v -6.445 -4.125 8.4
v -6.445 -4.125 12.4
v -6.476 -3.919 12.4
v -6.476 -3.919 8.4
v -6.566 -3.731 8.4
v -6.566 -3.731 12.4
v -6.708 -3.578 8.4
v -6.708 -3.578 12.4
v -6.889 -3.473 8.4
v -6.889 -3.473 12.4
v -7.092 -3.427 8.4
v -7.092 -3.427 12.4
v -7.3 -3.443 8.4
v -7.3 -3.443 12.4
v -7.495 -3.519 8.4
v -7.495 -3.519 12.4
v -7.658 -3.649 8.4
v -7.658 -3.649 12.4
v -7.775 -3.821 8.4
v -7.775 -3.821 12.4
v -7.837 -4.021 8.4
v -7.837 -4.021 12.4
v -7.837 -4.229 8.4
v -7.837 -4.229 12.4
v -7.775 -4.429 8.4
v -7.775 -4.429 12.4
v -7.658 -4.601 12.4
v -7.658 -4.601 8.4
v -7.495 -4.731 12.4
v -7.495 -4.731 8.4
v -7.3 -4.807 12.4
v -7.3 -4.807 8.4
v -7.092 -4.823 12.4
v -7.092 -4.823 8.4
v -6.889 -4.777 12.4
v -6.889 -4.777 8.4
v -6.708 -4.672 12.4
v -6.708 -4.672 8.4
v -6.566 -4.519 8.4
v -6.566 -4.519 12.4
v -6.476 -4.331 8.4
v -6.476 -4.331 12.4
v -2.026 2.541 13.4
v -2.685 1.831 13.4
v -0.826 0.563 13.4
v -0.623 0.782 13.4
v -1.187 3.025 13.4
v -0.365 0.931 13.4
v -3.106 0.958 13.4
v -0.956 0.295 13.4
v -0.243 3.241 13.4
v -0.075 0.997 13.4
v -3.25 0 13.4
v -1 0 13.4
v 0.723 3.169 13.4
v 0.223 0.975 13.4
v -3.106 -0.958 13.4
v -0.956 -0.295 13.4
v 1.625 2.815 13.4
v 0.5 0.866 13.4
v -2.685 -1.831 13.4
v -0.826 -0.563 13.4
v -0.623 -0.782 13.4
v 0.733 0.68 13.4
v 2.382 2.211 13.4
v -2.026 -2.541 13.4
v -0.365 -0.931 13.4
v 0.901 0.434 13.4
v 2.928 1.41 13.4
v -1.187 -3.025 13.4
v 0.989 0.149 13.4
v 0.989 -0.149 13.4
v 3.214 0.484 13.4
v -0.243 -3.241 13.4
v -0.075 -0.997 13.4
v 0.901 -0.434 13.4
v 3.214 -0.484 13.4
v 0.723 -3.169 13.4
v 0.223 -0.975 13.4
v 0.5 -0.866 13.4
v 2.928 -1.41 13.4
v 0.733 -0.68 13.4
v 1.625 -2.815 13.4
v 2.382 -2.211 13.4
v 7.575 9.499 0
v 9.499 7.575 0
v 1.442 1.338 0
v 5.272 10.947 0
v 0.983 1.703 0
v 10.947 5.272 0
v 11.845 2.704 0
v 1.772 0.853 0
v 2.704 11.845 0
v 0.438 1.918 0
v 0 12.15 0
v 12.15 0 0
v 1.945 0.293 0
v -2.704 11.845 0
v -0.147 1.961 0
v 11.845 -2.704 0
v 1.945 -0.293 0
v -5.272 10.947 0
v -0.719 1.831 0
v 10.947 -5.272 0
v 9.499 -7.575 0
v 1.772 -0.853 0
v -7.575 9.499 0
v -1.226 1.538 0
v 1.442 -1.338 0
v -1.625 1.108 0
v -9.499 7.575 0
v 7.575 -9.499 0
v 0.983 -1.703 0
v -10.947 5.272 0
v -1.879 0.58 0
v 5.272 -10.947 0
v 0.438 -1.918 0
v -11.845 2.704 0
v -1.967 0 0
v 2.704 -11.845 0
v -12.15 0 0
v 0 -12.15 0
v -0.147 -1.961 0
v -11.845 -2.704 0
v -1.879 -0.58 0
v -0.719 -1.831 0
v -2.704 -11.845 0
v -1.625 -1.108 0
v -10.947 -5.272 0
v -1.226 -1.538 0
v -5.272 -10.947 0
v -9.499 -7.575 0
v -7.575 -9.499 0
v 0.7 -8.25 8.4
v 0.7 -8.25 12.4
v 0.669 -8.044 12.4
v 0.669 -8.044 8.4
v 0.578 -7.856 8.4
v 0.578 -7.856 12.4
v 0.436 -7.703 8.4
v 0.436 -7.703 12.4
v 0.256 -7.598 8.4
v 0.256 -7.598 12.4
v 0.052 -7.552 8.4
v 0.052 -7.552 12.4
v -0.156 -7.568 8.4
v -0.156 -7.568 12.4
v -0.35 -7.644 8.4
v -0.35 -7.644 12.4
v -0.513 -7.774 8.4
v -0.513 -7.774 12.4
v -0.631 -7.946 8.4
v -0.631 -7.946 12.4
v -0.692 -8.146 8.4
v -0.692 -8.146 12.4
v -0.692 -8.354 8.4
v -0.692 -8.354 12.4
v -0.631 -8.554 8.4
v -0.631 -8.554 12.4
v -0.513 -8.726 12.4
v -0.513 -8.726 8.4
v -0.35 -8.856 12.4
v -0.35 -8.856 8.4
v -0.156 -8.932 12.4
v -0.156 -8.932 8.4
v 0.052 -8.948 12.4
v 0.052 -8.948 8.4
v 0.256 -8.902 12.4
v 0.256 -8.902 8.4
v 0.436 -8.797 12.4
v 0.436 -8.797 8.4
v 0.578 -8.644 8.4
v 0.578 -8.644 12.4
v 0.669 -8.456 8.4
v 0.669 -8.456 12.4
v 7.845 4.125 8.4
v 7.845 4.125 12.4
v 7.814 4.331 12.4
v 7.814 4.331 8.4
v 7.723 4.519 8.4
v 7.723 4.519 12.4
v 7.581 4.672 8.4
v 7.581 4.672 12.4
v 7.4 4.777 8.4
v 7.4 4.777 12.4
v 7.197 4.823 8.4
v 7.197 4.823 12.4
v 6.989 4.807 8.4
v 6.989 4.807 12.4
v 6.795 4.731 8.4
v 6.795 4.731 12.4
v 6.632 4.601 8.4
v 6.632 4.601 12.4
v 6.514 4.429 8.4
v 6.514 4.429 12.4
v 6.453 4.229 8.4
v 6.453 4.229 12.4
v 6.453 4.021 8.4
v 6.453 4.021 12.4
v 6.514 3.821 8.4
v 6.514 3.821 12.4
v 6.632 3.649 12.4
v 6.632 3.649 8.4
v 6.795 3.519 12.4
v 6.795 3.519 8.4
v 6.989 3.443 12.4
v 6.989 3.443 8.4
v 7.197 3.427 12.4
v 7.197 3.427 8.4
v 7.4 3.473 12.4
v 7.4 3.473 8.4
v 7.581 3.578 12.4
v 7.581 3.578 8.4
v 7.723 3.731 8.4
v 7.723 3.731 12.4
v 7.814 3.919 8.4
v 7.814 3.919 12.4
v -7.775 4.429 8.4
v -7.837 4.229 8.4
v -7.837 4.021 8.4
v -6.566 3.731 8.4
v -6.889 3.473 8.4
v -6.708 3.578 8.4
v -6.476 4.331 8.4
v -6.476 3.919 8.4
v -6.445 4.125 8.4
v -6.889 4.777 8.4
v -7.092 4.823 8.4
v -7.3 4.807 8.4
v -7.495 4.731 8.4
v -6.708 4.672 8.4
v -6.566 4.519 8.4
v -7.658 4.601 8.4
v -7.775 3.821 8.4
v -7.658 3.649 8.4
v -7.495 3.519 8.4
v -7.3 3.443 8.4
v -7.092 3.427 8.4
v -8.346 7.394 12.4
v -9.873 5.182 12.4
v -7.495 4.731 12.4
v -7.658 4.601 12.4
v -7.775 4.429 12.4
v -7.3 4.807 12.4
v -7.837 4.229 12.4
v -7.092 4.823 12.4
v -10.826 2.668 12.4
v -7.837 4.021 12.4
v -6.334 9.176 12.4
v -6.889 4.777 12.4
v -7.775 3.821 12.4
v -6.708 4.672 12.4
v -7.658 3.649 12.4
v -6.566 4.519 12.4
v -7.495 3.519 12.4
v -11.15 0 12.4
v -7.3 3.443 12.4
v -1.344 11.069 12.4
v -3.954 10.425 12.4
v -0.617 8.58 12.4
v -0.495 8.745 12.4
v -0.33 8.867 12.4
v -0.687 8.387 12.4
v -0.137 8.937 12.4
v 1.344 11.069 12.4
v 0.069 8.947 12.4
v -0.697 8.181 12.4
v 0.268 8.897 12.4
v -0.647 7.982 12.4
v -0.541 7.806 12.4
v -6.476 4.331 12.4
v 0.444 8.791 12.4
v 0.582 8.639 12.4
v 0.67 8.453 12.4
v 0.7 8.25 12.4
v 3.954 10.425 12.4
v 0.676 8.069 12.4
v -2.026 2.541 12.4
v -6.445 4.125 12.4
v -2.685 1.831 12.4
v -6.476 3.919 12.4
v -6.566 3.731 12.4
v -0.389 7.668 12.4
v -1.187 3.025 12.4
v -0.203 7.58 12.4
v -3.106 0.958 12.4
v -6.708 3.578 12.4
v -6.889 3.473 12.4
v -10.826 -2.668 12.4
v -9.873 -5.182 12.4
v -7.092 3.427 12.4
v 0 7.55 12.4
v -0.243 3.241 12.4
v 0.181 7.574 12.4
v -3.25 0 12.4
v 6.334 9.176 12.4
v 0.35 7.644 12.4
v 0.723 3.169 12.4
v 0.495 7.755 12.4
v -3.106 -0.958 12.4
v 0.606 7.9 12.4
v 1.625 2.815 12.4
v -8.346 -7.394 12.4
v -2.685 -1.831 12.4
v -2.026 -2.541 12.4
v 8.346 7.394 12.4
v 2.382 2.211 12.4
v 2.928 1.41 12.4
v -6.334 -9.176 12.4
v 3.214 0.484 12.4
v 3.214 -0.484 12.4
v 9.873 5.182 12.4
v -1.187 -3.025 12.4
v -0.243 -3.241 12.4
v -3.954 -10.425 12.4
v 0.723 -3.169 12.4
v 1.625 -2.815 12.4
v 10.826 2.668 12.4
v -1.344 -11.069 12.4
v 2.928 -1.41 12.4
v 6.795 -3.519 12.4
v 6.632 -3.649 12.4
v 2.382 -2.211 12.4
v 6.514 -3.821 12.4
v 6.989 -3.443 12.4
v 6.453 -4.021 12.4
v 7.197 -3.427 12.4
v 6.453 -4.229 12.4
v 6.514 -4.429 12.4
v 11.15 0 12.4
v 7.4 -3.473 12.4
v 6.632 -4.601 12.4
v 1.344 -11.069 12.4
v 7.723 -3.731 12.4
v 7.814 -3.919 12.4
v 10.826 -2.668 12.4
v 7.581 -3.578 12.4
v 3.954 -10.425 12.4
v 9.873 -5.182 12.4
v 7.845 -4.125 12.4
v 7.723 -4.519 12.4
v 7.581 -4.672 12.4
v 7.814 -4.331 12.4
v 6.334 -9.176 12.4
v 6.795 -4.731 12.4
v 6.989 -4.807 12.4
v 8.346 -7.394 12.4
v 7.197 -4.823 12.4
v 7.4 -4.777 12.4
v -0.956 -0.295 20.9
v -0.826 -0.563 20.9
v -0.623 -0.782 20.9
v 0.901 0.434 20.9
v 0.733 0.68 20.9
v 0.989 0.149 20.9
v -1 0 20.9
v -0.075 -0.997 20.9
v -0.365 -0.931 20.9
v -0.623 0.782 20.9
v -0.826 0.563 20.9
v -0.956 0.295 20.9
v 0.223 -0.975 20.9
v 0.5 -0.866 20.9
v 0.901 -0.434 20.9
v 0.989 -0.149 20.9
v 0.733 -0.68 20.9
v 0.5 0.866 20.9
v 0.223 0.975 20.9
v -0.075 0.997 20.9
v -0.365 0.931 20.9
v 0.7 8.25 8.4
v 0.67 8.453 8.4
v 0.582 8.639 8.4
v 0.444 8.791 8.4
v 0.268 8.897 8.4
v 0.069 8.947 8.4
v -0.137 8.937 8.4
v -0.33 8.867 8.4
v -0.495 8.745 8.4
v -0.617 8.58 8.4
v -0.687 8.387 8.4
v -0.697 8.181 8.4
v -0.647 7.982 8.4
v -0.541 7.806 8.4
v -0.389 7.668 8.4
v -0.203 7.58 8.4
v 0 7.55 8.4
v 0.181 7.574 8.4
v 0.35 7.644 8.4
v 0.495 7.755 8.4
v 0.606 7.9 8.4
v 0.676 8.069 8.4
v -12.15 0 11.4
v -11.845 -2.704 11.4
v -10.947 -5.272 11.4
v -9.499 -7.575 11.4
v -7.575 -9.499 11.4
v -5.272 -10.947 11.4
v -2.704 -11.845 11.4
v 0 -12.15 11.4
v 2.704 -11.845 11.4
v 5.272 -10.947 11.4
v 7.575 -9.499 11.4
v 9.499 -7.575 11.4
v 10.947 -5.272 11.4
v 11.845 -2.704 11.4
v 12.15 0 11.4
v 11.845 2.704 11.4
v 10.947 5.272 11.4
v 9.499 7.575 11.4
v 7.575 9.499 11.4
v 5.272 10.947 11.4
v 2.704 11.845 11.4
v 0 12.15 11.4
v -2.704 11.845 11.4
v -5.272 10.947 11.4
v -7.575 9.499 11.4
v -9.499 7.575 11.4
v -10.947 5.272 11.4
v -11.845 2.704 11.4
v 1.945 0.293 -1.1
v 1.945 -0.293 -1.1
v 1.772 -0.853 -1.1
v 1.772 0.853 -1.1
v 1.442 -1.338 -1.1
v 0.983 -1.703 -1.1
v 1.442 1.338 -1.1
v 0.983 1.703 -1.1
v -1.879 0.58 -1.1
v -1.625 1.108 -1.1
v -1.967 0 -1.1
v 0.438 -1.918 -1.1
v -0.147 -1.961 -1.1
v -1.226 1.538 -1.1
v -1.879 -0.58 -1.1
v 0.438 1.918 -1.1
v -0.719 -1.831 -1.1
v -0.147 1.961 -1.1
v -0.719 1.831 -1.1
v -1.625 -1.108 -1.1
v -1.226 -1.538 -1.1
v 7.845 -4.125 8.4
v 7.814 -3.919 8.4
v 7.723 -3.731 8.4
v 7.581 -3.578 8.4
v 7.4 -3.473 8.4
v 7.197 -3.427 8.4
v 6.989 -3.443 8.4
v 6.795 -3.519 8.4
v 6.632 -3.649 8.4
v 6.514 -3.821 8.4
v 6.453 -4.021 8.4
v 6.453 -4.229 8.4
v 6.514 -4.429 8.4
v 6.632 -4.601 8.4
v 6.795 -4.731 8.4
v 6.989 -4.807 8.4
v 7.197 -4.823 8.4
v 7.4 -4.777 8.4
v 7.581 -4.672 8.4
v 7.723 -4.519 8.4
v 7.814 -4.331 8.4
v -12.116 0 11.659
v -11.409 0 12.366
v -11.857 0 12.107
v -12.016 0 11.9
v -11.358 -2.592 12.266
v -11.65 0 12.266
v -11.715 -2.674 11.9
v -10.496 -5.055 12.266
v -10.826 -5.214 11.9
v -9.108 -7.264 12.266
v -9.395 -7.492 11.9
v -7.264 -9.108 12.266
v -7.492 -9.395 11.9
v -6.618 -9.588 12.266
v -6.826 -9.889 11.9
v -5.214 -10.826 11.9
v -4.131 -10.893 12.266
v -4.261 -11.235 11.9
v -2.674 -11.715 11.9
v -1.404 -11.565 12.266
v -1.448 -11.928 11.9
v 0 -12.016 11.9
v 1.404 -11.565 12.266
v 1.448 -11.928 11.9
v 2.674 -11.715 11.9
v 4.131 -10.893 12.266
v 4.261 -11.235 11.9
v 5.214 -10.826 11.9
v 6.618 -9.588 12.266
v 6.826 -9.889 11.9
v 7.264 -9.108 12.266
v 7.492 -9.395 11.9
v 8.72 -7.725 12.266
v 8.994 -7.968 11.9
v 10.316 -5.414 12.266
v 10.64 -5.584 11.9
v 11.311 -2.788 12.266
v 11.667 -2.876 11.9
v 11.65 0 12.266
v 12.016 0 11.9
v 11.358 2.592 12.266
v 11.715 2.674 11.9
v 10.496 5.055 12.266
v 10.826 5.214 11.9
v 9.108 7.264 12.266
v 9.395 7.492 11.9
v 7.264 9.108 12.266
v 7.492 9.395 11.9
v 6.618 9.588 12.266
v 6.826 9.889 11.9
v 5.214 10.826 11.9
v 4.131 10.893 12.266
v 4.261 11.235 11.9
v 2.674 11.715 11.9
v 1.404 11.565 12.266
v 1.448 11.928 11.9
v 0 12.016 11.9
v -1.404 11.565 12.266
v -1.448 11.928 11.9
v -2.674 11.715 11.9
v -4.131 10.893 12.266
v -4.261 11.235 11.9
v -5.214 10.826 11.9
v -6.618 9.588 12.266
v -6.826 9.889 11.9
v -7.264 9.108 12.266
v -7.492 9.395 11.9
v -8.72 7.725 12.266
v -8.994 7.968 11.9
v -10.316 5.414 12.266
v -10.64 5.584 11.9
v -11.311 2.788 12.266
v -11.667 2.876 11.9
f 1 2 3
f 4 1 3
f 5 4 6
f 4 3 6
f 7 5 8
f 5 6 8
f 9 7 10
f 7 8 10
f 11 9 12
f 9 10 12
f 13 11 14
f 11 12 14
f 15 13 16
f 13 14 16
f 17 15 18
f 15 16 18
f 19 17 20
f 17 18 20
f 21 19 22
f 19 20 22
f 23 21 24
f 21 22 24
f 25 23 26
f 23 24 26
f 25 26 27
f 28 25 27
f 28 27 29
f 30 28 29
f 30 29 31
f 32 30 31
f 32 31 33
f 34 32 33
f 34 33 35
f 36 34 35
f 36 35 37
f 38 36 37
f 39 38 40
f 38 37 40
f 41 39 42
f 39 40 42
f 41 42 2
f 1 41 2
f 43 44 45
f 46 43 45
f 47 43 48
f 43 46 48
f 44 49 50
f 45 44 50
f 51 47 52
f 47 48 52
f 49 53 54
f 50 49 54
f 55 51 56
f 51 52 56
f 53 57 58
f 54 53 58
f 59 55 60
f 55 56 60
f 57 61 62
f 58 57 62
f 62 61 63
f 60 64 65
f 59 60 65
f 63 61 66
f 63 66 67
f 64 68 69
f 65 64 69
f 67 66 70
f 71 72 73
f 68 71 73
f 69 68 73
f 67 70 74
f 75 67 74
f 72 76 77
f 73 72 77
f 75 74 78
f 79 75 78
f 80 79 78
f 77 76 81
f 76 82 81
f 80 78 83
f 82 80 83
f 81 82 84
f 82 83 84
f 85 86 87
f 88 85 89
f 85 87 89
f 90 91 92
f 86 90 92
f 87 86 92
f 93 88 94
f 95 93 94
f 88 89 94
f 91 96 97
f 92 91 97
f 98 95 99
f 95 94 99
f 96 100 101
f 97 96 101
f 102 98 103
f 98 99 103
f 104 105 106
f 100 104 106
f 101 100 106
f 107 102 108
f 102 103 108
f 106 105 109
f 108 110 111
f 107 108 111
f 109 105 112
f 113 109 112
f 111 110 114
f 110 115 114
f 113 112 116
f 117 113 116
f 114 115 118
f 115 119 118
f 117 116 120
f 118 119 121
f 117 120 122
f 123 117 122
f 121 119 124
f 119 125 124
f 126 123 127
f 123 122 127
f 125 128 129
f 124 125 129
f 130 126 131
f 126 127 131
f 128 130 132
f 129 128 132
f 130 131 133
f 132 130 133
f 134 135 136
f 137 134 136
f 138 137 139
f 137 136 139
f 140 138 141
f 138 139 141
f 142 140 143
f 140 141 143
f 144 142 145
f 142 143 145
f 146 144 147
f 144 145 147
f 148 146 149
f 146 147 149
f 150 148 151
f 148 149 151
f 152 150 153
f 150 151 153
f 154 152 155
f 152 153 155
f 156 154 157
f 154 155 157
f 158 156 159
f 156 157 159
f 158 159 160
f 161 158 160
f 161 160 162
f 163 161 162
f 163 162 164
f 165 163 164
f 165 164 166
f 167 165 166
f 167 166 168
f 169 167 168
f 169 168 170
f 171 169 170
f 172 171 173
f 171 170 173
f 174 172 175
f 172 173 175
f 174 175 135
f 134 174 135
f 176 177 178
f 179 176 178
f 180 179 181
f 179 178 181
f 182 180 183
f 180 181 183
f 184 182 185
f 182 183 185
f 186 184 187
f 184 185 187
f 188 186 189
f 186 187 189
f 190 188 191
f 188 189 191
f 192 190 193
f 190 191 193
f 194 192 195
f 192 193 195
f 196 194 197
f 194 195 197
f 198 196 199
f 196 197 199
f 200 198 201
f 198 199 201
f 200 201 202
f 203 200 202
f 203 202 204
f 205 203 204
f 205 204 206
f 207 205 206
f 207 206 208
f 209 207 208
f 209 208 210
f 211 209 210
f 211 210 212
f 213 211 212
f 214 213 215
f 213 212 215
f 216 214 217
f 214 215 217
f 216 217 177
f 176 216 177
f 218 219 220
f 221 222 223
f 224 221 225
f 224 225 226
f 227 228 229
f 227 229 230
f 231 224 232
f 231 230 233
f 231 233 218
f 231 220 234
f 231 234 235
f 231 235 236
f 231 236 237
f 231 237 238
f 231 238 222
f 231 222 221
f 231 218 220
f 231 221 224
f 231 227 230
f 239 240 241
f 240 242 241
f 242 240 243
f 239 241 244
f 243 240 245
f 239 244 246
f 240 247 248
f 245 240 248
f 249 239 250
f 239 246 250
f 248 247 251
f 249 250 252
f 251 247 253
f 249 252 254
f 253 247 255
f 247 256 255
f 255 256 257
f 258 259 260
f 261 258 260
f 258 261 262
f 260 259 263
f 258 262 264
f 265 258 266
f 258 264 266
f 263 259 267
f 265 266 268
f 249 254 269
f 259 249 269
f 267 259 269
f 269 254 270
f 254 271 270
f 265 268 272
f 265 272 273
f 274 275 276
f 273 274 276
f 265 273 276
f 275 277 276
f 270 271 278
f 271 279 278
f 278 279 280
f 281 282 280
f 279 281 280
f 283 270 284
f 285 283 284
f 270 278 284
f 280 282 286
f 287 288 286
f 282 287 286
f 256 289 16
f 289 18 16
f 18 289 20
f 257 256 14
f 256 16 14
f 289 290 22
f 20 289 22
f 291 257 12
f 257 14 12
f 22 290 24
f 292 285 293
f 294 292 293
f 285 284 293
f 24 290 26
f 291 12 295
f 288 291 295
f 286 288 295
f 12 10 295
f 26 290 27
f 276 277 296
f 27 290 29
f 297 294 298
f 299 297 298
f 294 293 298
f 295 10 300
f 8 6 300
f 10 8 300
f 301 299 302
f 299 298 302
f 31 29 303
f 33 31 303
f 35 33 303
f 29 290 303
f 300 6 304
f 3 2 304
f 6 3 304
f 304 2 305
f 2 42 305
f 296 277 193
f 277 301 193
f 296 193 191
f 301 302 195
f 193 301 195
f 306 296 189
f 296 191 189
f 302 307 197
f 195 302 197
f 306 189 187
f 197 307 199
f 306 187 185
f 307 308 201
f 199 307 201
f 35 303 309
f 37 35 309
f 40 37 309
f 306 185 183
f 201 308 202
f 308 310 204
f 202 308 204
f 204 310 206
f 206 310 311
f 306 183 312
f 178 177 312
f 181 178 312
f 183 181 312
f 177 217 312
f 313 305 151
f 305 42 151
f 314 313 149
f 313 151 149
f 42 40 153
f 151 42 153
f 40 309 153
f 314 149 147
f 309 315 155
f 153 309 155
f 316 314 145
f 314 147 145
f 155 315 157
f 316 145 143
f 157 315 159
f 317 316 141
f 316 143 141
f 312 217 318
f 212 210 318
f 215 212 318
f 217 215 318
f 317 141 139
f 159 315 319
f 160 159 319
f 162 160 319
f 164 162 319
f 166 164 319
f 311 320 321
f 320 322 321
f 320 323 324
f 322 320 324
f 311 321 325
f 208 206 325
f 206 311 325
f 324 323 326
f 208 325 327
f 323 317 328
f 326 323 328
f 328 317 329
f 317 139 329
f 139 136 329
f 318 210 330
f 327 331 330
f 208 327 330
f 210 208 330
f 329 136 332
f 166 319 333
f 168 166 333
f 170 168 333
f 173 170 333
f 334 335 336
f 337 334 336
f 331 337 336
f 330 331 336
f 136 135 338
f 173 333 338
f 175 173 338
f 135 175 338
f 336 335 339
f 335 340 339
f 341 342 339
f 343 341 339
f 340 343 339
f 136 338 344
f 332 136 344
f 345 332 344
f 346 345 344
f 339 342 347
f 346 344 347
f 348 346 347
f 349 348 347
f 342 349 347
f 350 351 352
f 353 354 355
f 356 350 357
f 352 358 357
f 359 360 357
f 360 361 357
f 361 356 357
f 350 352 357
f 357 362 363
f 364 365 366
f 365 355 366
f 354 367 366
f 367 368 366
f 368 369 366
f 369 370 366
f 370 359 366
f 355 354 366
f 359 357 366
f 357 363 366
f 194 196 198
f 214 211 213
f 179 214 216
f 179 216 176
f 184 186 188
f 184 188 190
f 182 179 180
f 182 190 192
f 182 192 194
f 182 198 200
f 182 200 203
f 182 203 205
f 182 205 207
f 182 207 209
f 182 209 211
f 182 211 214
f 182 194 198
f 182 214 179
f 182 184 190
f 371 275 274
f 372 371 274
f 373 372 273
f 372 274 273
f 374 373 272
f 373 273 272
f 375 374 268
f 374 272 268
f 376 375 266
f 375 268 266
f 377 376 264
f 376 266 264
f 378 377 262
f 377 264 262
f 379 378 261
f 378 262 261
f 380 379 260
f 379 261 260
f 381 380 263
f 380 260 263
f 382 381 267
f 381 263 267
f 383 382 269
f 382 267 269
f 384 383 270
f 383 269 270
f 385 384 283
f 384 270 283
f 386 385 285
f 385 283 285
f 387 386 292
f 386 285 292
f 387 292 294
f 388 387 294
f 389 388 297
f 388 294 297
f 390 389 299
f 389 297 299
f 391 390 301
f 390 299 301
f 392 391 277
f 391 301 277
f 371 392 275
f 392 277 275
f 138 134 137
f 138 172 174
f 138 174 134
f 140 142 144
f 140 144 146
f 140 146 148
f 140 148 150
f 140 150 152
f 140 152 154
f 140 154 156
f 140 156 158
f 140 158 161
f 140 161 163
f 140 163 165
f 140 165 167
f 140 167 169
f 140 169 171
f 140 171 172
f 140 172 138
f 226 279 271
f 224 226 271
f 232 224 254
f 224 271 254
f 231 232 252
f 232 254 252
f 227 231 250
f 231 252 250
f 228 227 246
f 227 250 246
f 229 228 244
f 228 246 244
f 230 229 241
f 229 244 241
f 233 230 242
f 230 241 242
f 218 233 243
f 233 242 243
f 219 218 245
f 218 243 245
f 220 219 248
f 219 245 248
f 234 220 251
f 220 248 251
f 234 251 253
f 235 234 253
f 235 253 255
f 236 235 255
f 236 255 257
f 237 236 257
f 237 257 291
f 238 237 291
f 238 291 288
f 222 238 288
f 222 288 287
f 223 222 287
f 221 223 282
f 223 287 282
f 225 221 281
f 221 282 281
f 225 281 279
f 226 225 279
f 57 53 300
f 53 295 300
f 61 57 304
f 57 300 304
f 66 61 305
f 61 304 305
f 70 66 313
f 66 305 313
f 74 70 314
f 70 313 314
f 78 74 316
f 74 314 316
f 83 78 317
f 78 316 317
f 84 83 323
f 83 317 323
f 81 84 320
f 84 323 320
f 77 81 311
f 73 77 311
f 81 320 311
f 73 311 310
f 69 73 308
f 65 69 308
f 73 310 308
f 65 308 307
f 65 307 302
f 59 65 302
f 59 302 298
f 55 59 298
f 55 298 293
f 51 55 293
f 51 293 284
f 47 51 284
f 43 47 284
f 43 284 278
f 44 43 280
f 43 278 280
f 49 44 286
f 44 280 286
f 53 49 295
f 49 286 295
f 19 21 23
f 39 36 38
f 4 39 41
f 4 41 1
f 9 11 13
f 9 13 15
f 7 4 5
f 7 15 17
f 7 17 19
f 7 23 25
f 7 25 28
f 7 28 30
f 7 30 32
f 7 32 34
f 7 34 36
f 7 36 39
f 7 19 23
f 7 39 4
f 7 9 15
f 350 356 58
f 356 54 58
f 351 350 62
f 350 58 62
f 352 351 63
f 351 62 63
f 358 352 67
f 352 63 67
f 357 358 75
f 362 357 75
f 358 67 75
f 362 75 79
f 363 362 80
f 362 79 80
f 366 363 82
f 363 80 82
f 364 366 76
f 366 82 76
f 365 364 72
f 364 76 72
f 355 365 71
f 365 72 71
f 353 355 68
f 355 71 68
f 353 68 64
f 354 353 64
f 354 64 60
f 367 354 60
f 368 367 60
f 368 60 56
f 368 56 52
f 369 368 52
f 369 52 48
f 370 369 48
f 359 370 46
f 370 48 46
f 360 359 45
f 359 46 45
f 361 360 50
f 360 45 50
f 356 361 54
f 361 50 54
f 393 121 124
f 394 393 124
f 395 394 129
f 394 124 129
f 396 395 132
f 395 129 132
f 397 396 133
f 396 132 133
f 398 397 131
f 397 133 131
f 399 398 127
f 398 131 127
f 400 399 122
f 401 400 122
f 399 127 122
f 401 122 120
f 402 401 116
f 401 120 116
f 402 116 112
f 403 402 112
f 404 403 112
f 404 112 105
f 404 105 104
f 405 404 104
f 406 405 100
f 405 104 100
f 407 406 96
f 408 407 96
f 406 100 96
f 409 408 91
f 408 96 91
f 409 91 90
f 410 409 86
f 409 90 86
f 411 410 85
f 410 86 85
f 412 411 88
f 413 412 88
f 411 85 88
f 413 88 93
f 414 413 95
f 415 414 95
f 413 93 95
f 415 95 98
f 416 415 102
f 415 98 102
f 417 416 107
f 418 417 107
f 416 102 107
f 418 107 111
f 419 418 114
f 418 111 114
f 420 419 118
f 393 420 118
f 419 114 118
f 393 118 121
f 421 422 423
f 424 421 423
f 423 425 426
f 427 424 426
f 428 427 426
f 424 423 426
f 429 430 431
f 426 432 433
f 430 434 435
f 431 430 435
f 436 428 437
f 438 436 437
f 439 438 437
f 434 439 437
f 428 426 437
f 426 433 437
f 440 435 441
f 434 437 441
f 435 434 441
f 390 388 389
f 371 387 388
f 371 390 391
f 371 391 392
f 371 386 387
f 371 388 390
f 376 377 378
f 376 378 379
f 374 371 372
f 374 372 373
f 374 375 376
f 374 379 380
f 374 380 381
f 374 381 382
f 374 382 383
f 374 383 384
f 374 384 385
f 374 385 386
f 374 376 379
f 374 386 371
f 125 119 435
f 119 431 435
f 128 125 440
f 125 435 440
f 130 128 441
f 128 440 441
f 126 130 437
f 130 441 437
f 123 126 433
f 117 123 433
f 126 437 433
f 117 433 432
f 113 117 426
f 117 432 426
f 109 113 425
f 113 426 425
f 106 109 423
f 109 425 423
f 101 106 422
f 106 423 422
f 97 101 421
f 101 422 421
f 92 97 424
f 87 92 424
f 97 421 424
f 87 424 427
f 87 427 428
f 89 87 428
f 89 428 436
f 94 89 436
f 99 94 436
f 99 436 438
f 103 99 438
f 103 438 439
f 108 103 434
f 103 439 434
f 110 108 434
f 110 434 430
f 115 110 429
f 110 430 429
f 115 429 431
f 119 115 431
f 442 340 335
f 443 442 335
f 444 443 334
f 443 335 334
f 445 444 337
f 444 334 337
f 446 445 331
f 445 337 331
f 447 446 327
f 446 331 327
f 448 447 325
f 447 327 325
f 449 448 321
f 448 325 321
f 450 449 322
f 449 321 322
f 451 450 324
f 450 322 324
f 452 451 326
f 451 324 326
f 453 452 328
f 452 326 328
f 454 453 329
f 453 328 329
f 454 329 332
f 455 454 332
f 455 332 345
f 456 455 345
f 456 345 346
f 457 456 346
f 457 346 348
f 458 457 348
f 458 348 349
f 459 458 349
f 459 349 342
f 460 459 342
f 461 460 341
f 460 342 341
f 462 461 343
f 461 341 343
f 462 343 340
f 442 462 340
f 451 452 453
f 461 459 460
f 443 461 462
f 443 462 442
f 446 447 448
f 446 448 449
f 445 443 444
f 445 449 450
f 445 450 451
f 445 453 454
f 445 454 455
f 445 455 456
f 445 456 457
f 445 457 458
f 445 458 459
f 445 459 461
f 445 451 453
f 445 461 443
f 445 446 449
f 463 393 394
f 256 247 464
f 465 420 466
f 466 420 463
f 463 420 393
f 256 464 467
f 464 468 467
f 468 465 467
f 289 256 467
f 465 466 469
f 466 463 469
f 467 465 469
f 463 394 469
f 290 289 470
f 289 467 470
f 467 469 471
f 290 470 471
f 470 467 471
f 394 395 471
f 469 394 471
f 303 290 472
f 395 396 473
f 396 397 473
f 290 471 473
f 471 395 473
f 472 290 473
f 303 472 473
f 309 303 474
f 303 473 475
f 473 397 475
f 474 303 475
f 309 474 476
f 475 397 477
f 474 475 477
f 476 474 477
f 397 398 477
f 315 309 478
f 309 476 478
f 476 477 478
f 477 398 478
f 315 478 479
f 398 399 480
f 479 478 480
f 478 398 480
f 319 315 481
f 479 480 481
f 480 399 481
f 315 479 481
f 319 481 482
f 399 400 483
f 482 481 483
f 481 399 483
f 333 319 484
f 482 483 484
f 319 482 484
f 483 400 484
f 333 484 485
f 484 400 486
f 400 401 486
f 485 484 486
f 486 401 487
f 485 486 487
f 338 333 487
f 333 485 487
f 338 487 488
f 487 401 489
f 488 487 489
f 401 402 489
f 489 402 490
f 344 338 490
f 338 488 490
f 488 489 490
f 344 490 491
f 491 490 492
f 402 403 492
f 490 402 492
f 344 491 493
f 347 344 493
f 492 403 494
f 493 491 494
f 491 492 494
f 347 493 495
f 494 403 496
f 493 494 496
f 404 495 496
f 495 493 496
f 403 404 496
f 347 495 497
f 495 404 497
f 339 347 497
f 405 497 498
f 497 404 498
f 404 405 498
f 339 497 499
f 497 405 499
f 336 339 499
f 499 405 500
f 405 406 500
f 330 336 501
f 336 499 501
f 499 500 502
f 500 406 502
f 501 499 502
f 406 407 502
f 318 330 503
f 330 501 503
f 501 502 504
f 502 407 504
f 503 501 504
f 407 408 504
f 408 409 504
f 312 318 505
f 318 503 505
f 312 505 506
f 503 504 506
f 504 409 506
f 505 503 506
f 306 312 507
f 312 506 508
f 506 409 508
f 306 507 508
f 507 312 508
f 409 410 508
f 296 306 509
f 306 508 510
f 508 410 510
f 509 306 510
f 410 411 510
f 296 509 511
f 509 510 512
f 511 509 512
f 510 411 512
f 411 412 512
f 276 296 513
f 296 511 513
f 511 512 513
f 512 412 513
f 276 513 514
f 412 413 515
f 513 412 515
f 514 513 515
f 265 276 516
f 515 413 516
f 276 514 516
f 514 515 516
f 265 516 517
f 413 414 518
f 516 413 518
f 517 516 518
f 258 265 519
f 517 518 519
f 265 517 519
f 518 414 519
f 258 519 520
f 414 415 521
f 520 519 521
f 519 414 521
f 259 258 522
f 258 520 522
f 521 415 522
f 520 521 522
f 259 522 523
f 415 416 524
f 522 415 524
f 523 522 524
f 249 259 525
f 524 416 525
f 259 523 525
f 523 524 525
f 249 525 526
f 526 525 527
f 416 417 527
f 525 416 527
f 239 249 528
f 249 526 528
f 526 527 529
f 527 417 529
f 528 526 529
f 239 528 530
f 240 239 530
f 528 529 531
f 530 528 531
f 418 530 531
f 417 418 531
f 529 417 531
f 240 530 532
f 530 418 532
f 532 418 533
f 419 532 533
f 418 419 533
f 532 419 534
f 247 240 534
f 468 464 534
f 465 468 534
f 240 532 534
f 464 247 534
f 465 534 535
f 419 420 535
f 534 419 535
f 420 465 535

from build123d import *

# Parameters (mm, degrees)
F2_R     = 0.7
F3_DEPTH = 4
F4_R     = 1


with BuildPart() as f1:
    # F0 (on Front) → F1 (revolve)
    with BuildSketch(Plane.XZ):
        Polygon((0, -1.1), (0, 0), (0, 20.9), (-1, 20.9), (-1, 13.4), (-3.25, 13.4), (-3.25, 12.4), (-12.15, 12.4), (-12.15, 0), (-1.966873, 0), (-1.966873, -1.1), align=None)
    revolve(axis=Axis((0, 0, 10.45), (0, 0, 1)))

    # F2 (on face) → F3 (cut)
    with BuildSketch(Plane.XY.offset(12.4)):
        with BuildLine():
            ThreePointArc((0, 7.55), (0.494975, 7.755025), (0.7, 8.25))
            ThreePointArc((0.7, 8.25), (-0.494975, 8.744975), (0, 7.55))
        make_face()
        with Locations((-7.14471, 4.125)):
            Circle(F2_R)
        with Locations((-7.14471, -4.125)):
            Circle(F2_R)
        with Locations((0, -8.25)):
            Circle(F2_R)
        with Locations((7.14471, -4.125)):
            Circle(F2_R)
        with Locations((7.14471, 4.125)):
            Circle(F2_R)
    extrude(amount=-F3_DEPTH, mode=Mode.SUBTRACT)

    # F4
    f4_edges = [f1.edges().sort_by_distance(p)[0] for p in [
        (12.15, 0, 12.4),
    ]]
    fillet(f4_edges, radius=F4_R)


solid = f1.part
